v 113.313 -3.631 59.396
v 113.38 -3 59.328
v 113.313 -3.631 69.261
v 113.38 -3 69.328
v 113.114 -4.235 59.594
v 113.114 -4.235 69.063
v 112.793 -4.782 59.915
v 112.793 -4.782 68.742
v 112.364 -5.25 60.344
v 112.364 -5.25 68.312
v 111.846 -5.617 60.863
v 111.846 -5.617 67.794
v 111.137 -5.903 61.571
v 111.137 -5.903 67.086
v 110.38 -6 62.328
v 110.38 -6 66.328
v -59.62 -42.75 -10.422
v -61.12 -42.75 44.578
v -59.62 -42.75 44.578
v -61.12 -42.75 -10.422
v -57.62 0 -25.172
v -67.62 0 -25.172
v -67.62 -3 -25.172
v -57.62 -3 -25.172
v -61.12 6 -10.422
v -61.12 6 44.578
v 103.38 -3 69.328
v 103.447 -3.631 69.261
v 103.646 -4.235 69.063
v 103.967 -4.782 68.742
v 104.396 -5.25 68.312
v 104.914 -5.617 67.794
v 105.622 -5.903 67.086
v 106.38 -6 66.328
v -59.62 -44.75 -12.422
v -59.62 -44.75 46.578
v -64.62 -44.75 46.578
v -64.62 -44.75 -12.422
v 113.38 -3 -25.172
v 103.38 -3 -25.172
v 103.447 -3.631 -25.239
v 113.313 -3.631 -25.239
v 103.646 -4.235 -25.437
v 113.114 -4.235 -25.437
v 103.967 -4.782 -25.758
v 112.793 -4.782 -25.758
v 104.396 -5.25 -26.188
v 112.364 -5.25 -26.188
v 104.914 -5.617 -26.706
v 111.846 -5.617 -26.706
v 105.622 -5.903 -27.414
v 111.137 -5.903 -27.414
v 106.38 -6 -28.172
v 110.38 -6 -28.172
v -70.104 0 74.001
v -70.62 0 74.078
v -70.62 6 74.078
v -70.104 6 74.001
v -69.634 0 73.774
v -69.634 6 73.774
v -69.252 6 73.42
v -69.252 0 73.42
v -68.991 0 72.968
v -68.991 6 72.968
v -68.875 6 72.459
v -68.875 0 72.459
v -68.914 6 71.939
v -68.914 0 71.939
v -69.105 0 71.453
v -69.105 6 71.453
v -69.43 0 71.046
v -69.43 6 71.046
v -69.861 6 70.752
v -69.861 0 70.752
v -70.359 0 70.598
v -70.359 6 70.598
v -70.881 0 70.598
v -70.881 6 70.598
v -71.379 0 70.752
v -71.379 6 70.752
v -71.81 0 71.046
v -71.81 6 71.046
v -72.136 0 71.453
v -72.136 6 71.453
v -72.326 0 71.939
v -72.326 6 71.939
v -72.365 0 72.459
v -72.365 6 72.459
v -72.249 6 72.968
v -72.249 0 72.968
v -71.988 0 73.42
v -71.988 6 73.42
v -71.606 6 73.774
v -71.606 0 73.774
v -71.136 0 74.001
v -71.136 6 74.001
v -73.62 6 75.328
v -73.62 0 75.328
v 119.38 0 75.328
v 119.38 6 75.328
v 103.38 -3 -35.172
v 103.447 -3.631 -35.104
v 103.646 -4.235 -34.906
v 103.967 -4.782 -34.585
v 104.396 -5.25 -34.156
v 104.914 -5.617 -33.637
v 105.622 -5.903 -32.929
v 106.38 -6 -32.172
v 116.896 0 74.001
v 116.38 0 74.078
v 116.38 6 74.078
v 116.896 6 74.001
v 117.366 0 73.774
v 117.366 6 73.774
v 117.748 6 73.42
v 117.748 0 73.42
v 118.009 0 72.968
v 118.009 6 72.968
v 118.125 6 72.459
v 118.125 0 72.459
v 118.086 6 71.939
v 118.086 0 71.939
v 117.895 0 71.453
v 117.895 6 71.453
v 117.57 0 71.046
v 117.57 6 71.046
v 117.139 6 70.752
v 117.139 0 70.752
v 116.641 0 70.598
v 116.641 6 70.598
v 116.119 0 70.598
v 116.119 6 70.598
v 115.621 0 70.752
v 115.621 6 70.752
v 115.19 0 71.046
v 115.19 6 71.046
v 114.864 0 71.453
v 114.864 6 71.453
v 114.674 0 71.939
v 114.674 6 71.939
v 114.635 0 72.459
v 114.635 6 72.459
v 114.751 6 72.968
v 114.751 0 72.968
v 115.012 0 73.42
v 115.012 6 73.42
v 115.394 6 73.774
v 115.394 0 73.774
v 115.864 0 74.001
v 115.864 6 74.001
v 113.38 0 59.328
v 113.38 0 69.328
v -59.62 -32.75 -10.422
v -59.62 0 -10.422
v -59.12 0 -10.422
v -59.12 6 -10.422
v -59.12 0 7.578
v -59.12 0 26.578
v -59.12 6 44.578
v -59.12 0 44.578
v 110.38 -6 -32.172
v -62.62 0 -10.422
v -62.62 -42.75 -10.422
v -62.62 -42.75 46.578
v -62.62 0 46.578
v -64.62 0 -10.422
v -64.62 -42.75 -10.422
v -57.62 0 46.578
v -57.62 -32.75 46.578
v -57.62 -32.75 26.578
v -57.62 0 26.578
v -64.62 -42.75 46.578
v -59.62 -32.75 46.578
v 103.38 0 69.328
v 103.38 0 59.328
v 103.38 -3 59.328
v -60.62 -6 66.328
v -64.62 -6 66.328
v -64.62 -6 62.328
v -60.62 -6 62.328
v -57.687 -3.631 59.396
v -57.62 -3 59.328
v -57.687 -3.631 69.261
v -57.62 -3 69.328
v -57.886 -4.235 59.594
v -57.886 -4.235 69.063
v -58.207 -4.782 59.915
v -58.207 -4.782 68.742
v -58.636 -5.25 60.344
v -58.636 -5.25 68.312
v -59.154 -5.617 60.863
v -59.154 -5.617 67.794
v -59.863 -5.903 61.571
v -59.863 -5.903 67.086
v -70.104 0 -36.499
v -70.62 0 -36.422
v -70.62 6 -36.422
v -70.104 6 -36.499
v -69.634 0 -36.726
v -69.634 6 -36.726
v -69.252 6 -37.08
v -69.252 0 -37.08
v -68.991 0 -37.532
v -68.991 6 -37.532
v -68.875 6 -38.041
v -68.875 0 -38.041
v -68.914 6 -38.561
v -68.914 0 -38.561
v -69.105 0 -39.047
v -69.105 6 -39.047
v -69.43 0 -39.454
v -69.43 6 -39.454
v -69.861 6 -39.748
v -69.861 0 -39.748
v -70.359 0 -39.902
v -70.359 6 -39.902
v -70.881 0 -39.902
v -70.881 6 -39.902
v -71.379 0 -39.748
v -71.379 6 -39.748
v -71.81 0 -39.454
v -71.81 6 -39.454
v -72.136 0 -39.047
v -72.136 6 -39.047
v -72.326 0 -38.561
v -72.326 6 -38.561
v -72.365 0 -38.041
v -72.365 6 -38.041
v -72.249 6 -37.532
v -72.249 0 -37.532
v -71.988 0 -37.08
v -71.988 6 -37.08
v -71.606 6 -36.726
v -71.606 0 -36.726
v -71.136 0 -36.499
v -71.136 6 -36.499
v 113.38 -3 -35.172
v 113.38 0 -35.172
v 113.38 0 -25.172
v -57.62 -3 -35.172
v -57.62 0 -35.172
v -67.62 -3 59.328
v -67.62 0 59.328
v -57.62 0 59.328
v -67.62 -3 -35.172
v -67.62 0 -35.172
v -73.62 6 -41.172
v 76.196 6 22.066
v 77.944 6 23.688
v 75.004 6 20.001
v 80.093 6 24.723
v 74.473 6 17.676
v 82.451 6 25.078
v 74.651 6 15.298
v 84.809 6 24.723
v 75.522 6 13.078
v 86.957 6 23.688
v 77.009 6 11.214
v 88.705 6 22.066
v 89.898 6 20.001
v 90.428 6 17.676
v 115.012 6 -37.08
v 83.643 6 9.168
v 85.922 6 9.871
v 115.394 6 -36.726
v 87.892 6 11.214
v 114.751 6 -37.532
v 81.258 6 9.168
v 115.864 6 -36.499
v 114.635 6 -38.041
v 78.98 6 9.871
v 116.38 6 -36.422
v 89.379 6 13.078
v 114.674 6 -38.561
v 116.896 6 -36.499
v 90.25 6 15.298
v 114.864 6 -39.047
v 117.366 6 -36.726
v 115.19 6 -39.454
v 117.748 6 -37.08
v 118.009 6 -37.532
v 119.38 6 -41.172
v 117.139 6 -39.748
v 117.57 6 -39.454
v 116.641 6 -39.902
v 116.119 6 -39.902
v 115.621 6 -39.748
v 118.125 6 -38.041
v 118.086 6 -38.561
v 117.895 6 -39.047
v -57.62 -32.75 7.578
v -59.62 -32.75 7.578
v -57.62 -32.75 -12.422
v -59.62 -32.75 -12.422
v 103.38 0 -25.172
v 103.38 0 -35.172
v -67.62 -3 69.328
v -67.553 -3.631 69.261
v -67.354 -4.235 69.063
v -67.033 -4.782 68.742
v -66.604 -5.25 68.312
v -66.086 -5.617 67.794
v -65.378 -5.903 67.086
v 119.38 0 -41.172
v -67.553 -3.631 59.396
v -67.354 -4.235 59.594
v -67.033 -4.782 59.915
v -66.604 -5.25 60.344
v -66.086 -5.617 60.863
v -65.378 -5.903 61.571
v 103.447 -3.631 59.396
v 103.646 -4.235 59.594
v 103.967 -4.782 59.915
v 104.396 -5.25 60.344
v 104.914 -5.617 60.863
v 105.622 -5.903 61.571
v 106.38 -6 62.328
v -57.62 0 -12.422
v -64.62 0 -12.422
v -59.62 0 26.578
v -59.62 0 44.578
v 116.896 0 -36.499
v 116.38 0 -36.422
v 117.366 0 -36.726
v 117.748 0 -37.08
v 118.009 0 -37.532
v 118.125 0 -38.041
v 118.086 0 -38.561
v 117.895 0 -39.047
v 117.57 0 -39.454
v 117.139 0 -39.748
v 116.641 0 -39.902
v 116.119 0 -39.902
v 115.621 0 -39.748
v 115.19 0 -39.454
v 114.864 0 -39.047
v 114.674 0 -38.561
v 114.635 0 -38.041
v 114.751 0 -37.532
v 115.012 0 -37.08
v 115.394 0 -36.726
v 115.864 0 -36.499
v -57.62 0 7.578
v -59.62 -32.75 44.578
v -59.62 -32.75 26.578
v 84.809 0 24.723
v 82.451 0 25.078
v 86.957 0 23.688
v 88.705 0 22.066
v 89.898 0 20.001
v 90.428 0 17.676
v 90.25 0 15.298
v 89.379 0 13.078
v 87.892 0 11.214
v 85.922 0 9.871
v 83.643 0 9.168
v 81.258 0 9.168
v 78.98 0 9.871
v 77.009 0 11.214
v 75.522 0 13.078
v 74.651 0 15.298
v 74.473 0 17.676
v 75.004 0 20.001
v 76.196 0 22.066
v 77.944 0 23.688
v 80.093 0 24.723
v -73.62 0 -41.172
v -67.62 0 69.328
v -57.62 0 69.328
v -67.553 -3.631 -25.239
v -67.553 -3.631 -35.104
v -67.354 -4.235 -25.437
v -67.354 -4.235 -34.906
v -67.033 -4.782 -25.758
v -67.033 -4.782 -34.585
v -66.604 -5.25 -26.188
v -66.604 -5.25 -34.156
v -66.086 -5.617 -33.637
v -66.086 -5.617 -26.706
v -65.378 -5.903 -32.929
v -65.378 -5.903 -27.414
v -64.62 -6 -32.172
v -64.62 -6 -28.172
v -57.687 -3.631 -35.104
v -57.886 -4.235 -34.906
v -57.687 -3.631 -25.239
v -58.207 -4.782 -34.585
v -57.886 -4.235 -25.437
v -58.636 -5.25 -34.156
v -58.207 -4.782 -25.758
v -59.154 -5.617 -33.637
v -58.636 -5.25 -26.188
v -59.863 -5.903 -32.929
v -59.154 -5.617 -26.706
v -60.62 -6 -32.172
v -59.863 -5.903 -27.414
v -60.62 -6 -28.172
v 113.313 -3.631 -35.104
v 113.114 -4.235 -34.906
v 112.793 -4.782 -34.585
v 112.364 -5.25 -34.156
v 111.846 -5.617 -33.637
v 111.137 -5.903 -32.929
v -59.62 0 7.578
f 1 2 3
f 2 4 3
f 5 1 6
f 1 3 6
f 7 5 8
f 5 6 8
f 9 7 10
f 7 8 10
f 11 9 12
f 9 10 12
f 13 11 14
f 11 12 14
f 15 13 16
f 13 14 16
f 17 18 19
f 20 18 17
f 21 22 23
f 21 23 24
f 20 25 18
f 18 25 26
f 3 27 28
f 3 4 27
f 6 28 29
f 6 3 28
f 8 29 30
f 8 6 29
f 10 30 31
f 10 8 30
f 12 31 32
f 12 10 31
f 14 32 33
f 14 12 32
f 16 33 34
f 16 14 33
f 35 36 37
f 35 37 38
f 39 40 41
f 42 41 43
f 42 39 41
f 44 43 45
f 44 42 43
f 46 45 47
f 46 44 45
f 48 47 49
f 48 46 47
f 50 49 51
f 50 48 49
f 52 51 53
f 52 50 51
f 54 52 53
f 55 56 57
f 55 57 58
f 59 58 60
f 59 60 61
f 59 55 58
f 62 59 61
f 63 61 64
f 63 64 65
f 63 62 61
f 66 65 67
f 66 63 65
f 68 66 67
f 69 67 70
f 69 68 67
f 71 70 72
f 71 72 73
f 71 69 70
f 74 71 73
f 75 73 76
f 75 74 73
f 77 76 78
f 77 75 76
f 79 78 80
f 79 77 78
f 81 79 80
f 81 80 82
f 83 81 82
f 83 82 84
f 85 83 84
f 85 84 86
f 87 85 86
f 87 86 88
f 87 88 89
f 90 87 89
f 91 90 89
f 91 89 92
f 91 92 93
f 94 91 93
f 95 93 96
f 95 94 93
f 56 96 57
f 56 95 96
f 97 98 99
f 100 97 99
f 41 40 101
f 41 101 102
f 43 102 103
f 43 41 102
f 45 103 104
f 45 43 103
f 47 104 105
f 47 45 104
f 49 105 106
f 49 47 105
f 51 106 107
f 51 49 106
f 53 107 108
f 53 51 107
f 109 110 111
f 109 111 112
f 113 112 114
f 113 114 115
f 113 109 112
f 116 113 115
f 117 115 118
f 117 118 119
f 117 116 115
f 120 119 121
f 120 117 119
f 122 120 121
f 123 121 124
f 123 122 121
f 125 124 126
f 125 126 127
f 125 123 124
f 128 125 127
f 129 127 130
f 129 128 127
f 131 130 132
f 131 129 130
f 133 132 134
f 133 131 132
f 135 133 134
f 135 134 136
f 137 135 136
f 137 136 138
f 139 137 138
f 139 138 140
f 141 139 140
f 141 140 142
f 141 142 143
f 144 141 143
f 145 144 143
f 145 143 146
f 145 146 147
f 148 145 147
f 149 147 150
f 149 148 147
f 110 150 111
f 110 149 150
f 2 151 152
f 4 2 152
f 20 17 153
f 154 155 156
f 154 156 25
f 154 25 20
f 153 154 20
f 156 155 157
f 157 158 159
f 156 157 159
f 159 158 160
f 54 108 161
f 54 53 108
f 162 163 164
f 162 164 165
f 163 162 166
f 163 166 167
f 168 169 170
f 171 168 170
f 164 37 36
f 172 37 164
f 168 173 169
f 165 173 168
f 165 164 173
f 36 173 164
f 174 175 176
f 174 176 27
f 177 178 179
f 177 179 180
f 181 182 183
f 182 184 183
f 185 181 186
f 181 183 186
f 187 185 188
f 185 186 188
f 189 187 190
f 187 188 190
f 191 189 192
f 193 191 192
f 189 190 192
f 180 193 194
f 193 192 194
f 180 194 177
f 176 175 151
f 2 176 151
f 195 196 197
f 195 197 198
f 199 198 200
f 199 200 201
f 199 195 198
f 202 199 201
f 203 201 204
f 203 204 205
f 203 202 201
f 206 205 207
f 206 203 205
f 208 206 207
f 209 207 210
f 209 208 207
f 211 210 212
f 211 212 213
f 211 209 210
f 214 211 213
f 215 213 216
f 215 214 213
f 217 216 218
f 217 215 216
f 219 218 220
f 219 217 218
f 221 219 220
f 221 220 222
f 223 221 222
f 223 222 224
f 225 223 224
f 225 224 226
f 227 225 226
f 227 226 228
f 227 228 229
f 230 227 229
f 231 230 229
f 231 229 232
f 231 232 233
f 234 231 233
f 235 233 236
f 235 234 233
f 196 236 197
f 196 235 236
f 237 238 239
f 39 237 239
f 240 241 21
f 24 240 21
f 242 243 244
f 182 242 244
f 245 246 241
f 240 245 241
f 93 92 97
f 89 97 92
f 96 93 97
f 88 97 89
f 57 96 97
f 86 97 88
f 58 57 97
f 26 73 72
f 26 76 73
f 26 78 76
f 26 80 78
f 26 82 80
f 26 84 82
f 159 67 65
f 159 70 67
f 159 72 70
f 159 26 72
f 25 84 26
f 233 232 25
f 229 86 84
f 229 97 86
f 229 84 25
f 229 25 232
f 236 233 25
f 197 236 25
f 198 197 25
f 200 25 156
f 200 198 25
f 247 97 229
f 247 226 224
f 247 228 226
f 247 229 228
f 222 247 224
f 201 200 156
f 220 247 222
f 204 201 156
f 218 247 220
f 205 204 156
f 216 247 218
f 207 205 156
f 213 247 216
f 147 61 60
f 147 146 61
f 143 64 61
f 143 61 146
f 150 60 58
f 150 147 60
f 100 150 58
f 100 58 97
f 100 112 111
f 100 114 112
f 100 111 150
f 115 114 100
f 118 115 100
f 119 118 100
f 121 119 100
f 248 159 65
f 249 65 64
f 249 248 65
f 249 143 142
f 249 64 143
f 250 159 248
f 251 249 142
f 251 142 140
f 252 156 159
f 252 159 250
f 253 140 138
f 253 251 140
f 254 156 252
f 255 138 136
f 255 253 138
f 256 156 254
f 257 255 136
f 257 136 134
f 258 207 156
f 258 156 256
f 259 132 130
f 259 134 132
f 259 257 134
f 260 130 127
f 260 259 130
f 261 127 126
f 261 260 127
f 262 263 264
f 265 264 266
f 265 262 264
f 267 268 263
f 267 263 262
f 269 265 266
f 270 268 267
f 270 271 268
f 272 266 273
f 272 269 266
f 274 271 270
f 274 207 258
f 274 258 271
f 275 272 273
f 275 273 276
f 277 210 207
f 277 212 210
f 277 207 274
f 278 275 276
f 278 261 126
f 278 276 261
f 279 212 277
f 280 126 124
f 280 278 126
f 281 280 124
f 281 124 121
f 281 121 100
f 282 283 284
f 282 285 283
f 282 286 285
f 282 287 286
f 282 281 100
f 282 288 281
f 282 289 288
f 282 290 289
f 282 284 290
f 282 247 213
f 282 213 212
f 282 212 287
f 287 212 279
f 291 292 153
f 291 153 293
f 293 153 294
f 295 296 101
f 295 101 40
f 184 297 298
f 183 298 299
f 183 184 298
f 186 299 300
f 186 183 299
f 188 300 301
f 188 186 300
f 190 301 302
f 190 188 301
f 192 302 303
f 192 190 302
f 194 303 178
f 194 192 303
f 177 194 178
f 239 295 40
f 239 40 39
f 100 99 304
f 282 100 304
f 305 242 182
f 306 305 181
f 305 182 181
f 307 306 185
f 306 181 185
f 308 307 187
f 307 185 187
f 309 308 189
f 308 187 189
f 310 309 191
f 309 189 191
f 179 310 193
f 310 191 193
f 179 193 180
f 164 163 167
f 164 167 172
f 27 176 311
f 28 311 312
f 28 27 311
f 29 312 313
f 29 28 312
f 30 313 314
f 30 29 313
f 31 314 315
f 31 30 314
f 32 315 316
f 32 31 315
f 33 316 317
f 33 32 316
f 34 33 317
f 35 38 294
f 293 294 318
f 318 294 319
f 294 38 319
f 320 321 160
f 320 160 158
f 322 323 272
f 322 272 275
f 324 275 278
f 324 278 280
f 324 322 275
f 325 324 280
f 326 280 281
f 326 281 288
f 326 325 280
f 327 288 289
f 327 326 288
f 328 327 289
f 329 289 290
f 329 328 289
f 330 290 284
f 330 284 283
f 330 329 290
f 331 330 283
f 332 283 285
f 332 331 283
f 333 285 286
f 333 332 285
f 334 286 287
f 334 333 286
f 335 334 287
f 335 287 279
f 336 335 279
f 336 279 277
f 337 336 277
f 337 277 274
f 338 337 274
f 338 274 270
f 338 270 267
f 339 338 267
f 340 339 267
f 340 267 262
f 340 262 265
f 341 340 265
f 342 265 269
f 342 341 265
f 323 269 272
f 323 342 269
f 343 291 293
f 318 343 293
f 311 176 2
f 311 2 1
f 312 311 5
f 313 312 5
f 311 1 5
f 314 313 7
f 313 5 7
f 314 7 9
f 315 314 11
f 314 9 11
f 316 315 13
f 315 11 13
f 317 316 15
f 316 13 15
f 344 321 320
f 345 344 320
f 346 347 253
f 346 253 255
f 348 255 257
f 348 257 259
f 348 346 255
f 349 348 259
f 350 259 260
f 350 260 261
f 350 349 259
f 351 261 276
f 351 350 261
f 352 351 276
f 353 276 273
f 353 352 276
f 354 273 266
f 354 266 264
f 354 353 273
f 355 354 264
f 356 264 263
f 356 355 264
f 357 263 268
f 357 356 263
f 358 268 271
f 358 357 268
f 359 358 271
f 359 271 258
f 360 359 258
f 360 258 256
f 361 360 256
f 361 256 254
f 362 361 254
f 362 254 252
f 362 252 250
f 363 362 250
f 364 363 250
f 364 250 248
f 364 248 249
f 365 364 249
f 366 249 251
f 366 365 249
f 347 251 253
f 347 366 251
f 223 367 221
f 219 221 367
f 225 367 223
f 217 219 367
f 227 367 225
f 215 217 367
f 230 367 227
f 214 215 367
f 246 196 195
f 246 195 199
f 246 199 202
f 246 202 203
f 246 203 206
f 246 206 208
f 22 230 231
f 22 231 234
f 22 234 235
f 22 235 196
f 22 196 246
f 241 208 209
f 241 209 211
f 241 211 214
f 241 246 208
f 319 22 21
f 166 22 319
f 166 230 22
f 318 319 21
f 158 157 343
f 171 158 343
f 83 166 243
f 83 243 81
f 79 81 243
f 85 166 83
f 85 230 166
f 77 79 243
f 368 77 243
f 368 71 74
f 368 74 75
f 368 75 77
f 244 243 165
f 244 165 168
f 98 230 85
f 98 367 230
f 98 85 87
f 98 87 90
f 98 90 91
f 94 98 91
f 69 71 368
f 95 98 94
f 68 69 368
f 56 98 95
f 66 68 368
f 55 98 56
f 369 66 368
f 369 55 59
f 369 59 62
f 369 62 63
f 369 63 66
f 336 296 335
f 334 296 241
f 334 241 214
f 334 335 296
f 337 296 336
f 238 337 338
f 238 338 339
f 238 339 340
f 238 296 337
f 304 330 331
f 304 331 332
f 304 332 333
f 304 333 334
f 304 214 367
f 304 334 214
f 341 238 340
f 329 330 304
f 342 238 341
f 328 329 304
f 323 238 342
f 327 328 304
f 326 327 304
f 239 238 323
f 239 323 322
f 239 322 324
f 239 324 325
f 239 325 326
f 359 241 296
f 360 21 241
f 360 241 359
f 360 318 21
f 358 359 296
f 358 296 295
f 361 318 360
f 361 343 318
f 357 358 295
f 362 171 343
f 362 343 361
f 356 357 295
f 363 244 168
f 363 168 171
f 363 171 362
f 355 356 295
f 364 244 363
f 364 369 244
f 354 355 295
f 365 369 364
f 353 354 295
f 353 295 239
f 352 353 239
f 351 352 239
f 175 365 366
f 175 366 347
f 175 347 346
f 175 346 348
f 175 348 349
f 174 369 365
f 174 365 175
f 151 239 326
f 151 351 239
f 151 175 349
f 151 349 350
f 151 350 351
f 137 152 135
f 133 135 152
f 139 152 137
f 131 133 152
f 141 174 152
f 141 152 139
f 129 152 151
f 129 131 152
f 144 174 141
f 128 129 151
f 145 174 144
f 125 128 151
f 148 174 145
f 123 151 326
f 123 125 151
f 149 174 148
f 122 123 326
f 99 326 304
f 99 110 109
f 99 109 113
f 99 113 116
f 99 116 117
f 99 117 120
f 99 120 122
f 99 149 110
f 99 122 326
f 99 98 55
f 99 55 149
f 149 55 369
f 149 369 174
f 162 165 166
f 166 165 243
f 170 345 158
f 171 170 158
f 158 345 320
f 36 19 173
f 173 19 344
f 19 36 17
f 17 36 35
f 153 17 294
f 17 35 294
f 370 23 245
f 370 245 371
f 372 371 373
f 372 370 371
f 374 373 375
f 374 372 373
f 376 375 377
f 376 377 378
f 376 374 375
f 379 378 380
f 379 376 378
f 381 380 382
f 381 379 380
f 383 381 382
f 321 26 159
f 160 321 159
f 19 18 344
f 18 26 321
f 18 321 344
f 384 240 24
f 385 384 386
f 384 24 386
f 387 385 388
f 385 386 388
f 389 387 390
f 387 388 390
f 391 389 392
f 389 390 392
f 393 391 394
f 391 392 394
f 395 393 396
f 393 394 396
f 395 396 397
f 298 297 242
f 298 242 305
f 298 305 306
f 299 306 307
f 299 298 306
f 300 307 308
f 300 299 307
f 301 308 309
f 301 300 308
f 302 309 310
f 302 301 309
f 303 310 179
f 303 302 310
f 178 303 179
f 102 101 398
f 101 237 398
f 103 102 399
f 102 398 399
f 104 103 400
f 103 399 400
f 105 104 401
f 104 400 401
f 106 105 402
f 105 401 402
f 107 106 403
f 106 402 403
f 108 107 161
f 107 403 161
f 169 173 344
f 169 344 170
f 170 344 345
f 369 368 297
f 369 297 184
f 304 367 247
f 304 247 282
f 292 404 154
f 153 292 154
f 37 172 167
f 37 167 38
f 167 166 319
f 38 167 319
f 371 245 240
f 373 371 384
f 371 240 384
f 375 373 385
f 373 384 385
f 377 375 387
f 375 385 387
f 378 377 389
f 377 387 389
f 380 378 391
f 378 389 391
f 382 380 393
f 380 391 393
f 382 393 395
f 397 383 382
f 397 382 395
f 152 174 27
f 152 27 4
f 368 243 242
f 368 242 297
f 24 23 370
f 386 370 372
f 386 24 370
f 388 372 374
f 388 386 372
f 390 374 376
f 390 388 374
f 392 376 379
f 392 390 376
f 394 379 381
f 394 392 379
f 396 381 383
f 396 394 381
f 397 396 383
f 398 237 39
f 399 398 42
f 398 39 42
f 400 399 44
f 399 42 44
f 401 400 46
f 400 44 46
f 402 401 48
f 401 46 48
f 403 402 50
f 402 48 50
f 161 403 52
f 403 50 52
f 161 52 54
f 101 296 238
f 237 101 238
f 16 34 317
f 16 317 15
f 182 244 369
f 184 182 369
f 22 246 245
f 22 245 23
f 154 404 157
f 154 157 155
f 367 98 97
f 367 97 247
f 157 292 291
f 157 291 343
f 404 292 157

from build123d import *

# Parameters (mm, degrees)
SKETCH1_W            = 193
SKETCH1_H            = 116.5
SKETCH1_R            = 1.75
SKETCH1_R_2          = 8
SKETCH1_W_2          = 2
SKETCH1_H_2          = 55
BOSS_EXTRUDE1_DEPTH  = 6
SKETCH3_W            = 10
SKETCH3_H            = 10
BOSS_EXTRUDE3_DEPTH  = 10
SKETCH5_W            = 2
SKETCH5_H            = 55
BOSS_EXTRUDE4_DEPTH  = 6
SKETCH6_W            = 181
SKETCH6_H            = 104.5
CUT_EXTRUDE1_DEPTH   = 4
SKETCH7_W            = 1.5
SKETCH7_H            = 55
BOSS_EXTRUDE5_DEPTH  = 44.75
SKETCH8_W            = 2
SKETCH8_H            = 55
CUT_EXTRUDE2_DEPTH   = 42.25
FILLET3_R            = 3
SKETCH12_W           = 55
SKETCH12_H           = 2
BOSS_EXTRUDE6_DEPTH  = 1.5
SKETCH14_W           = 3
SKETCH14_H           = 44.75
BOSS_EXTRUDE7_DEPTH  = 2
SKETCH15_W           = 3
SKETCH15_H           = 44.75
BOSS_EXTRUDE8_DEPTH  = 2
BOSS_EXTRUDE9_DEPTH  = 2
SKETCH18_W           = 20
SKETCH18_H           = 32.75
BOSS_EXTRUDE10_DEPTH = 2


with BuildPart() as part:
    # Sketch1 → Boss-Extrude1 (new body)
    with BuildSketch(Plane(origin=(0, 0, 0), x_dir=(1, 0, 0), z_dir=(0, 1, 0))):
        with Locations((22.87983871, -17.078434096)):
            Rectangle(SKETCH1_W, SKETCH1_H)
        with Locations(Location((-70.62016129, -72.328434096, 0), (0, 0, 270))):
            Circle(SKETCH1_R, mode=Mode.SUBTRACT)
        with Locations(Location((-70.62016129, 38.171565904, 0), (0, 0, 270))):
            Circle(SKETCH1_R, mode=Mode.SUBTRACT)
        with Locations(Location((116.37983871, -72.328434096, 0), (0, 0, 270))):
            Circle(SKETCH1_R, mode=Mode.SUBTRACT)
        with Locations(Location((116.37983871, 38.171565904, 0), (0, 0, 270))):
            Circle(SKETCH1_R, mode=Mode.SUBTRACT)
        with Locations(Location((82.450678359, -17.078434096, 0), (0, 0, 270))):
            Circle(SKETCH1_R_2, mode=Mode.SUBTRACT)
        with Locations((-47.331266899, -17.078434096)):
            Rectangle(SKETCH1_W_2, SKETCH1_H_2, mode=Mode.SUBTRACT)
    extrude(amount=BOSS_EXTRUDE1_DEPTH)

    # Sketch3 → Boss-Extrude3 (add)
    with BuildSketch(Plane.XZ):
        with Locations((-62.62016129, 64.328434096)):
            Rectangle(SKETCH3_W, SKETCH3_H)
        with Locations((-62.62016129, -30.171565904)):
            Rectangle(SKETCH3_W, SKETCH3_H)
        with Locations((108.37983871, -30.171565904)):
            Rectangle(SKETCH3_W, SKETCH3_H)
        with Locations((108.37983871, 64.328434096)):
            Rectangle(SKETCH3_W, SKETCH3_H)
    extrude(amount=BOSS_EXTRUDE3_DEPTH)

    # Sketch5 → Boss-Extrude4 (add)
    with BuildSketch(Plane.XZ):
        with Locations((-47.331266899, 17.078434096)):
            Rectangle(SKETCH5_W, SKETCH5_H)
    extrude(amount=-BOSS_EXTRUDE4_DEPTH)

    # Sketch6 → Cut-Extrude1 (cut)
    with BuildSketch(Plane.XZ.offset(10)):
        with Locations((22.87983871, 17.078434096)):
            Rectangle(SKETCH6_W, SKETCH6_H)
    extrude(amount=-CUT_EXTRUDE1_DEPTH, mode=Mode.SUBTRACT)

    # Sketch7 → Boss-Extrude5 (add)
    with BuildSketch(Plane.XZ):
        with Locations((-61.87016129, 17.078434096)):
            Rectangle(SKETCH7_W, SKETCH7_H)
    extrude(amount=BOSS_EXTRUDE5_DEPTH)

    # Sketch8 → Cut-Extrude2 (cut)
    with BuildSketch(Plane.XZ):
        with Locations((-60.12016129, 17.078434096)):
            Rectangle(SKETCH8_W, SKETCH8_H)
    extrude(amount=-CUT_EXTRUDE2_DEPTH, mode=Mode.SUBTRACT)

    # Fillet3
    fillet3_edges = [part.edges().sort_by_distance(p)[0] for p in [
        (-67.62016129, -6, 64.328434096),
        (-67.62016129, -6, -30.171565904),
        (-62.62016129, -6, -35.171565904),
        (108.37983871, -6, -35.171565904),
        (-62.62016129, -6, 69.328434096),
        (108.37983871, -6, 69.328434096),
        (113.37983871, -6, -30.171565904),
        (113.37983871, -6, 64.328434096),
        (-62.62016129, -6, 59.328434096),
        (-57.62016129, -6, 64.328434096),
        (103.37983871, -6, 64.328434096),
        (108.37983871, -6, 59.328434096),
        (108.37983871, -6, -25.171565904),
        (103.37983871, -6, -30.171565904),
        (-57.62016129, -6, -30.171565904),
        (-62.62016129, -6, -25.171565904),
    ]]
    fillet(fillet3_edges, radius=FILLET3_R)

    # Sketch12 → Boss-Extrude6 (add)
    with BuildSketch(Plane(origin=(-61.12016129, 0, 0), x_dir=(0, 0, -1), z_dir=(1, 0, 0))):
        with Locations((-17.078434096, -43.75)):
            Rectangle(SKETCH12_W, SKETCH12_H)
    extrude(amount=BOSS_EXTRUDE6_DEPTH)

    # Sketch14 → Boss-Extrude7 (add)
    with BuildSketch(Plane(origin=(0, 0, -10.421565904), x_dir=(-1, 0, 0), z_dir=(0, 0, -1))):
        with Locations((61.12016129, -22.375)):
            Rectangle(SKETCH14_W, SKETCH14_H)
    extrude(amount=BOSS_EXTRUDE7_DEPTH)

    # Sketch15 → Boss-Extrude8 (add)
    with BuildSketch(Plane.XY.offset(44.578434096)):
        with Locations((-61.12016129, -22.375)):
            Rectangle(SKETCH15_W, SKETCH15_H)
    extrude(amount=BOSS_EXTRUDE8_DEPTH)

    # Sketch16 → Boss-Extrude9 (add)
    with BuildSketch(Plane.ZY.offset(62.62016129)):
        Polygon((-10.421565904, 0), (-10.421565904, -42.75), (46.578434096, -42.75), (46.578434096, -44.75), (-12.421565904, -44.75), (-12.421565904, 0), align=None)
    extrude(amount=BOSS_EXTRUDE9_DEPTH)

    # Sketch18 → Boss-Extrude10 (add)
    with BuildSketch(Plane(origin=(-59.62016129, 0, 0), x_dir=(0, 0, -1), z_dir=(1, 0, 0))):
        with Locations((-36.578434096, -16.375)):
            Rectangle(SKETCH18_W, SKETCH18_H)
        with Locations((2.421565904, -16.375)):
            Rectangle(SKETCH18_W, SKETCH18_H)
    extrude(amount=BOSS_EXTRUDE10_DEPTH)


solid = part.part
